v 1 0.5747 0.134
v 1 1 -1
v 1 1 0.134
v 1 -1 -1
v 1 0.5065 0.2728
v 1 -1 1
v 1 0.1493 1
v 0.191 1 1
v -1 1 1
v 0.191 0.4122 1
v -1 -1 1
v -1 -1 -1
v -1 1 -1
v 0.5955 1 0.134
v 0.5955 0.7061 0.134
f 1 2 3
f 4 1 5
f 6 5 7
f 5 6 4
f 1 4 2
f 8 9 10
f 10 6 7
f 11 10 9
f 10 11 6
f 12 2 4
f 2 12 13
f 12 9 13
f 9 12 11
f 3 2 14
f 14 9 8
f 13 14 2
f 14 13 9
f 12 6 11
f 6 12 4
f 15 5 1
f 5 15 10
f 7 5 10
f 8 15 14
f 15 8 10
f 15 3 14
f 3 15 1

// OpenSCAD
difference() {
  cube(2, center=true);
  translate([1, 1, 1]) sphere(1);
}
